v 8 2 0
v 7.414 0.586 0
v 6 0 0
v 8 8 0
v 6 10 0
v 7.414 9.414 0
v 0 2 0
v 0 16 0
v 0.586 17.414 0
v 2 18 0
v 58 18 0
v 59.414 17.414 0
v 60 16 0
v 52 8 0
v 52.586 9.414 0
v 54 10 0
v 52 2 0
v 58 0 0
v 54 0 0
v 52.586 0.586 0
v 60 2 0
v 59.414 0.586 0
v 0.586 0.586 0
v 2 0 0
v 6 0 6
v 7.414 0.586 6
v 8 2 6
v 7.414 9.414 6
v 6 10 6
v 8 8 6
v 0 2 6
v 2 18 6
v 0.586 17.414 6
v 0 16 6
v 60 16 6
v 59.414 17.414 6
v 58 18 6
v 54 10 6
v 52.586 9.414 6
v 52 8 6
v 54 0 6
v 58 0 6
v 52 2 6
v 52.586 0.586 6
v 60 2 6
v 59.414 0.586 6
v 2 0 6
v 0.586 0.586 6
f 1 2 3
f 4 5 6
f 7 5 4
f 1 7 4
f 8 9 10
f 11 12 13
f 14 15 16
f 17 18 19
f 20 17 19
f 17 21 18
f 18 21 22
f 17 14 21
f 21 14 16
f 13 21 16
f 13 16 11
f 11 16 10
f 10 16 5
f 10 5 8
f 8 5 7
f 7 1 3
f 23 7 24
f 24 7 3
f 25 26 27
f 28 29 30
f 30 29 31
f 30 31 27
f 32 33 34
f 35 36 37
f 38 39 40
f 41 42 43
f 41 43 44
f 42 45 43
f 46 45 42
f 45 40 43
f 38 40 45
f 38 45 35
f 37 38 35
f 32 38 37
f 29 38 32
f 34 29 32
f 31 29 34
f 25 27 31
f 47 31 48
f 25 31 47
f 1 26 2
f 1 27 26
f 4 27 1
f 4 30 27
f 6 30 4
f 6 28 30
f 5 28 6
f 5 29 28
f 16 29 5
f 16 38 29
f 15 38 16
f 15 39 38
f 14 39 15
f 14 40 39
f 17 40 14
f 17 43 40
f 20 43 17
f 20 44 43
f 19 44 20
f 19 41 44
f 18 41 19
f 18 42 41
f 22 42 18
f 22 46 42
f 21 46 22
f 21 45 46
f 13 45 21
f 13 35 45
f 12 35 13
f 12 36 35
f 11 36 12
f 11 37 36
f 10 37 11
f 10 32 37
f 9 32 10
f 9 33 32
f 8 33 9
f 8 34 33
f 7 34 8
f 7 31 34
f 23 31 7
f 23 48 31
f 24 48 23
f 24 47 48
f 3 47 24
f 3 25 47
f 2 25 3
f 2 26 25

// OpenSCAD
$fn = 32;

// ----------------------------------------------------------------------
// Clip blank: staple clip, 6 mm thick
// ----------------------------------------------------------------------

// --- parameters (mm) ---
profile_height = 6;       // extrusion height
profile_points = 24;      // points of the closed outline

profile = [[0, 2], [0.586, 0.586], [2, 0], [6, 0], [7.414, 0.586], [8, 2], [8, 8], [7.414, 9.414], [6, 10], [54, 10], [52.586, 9.414], [52, 8], [52, 2], [52.586, 0.586], [54, 0], [58, 0], [59.414, 0.586], [60, 2], [60, 16], [59.414, 17.414], [58, 18], [2, 18], [0.586, 17.414], [0, 16]];  // single closed polygon, 24 points, counter clockwise

// --- the one profile operation ---
linear_extrude(height = profile_height) polygon(points = profile);
